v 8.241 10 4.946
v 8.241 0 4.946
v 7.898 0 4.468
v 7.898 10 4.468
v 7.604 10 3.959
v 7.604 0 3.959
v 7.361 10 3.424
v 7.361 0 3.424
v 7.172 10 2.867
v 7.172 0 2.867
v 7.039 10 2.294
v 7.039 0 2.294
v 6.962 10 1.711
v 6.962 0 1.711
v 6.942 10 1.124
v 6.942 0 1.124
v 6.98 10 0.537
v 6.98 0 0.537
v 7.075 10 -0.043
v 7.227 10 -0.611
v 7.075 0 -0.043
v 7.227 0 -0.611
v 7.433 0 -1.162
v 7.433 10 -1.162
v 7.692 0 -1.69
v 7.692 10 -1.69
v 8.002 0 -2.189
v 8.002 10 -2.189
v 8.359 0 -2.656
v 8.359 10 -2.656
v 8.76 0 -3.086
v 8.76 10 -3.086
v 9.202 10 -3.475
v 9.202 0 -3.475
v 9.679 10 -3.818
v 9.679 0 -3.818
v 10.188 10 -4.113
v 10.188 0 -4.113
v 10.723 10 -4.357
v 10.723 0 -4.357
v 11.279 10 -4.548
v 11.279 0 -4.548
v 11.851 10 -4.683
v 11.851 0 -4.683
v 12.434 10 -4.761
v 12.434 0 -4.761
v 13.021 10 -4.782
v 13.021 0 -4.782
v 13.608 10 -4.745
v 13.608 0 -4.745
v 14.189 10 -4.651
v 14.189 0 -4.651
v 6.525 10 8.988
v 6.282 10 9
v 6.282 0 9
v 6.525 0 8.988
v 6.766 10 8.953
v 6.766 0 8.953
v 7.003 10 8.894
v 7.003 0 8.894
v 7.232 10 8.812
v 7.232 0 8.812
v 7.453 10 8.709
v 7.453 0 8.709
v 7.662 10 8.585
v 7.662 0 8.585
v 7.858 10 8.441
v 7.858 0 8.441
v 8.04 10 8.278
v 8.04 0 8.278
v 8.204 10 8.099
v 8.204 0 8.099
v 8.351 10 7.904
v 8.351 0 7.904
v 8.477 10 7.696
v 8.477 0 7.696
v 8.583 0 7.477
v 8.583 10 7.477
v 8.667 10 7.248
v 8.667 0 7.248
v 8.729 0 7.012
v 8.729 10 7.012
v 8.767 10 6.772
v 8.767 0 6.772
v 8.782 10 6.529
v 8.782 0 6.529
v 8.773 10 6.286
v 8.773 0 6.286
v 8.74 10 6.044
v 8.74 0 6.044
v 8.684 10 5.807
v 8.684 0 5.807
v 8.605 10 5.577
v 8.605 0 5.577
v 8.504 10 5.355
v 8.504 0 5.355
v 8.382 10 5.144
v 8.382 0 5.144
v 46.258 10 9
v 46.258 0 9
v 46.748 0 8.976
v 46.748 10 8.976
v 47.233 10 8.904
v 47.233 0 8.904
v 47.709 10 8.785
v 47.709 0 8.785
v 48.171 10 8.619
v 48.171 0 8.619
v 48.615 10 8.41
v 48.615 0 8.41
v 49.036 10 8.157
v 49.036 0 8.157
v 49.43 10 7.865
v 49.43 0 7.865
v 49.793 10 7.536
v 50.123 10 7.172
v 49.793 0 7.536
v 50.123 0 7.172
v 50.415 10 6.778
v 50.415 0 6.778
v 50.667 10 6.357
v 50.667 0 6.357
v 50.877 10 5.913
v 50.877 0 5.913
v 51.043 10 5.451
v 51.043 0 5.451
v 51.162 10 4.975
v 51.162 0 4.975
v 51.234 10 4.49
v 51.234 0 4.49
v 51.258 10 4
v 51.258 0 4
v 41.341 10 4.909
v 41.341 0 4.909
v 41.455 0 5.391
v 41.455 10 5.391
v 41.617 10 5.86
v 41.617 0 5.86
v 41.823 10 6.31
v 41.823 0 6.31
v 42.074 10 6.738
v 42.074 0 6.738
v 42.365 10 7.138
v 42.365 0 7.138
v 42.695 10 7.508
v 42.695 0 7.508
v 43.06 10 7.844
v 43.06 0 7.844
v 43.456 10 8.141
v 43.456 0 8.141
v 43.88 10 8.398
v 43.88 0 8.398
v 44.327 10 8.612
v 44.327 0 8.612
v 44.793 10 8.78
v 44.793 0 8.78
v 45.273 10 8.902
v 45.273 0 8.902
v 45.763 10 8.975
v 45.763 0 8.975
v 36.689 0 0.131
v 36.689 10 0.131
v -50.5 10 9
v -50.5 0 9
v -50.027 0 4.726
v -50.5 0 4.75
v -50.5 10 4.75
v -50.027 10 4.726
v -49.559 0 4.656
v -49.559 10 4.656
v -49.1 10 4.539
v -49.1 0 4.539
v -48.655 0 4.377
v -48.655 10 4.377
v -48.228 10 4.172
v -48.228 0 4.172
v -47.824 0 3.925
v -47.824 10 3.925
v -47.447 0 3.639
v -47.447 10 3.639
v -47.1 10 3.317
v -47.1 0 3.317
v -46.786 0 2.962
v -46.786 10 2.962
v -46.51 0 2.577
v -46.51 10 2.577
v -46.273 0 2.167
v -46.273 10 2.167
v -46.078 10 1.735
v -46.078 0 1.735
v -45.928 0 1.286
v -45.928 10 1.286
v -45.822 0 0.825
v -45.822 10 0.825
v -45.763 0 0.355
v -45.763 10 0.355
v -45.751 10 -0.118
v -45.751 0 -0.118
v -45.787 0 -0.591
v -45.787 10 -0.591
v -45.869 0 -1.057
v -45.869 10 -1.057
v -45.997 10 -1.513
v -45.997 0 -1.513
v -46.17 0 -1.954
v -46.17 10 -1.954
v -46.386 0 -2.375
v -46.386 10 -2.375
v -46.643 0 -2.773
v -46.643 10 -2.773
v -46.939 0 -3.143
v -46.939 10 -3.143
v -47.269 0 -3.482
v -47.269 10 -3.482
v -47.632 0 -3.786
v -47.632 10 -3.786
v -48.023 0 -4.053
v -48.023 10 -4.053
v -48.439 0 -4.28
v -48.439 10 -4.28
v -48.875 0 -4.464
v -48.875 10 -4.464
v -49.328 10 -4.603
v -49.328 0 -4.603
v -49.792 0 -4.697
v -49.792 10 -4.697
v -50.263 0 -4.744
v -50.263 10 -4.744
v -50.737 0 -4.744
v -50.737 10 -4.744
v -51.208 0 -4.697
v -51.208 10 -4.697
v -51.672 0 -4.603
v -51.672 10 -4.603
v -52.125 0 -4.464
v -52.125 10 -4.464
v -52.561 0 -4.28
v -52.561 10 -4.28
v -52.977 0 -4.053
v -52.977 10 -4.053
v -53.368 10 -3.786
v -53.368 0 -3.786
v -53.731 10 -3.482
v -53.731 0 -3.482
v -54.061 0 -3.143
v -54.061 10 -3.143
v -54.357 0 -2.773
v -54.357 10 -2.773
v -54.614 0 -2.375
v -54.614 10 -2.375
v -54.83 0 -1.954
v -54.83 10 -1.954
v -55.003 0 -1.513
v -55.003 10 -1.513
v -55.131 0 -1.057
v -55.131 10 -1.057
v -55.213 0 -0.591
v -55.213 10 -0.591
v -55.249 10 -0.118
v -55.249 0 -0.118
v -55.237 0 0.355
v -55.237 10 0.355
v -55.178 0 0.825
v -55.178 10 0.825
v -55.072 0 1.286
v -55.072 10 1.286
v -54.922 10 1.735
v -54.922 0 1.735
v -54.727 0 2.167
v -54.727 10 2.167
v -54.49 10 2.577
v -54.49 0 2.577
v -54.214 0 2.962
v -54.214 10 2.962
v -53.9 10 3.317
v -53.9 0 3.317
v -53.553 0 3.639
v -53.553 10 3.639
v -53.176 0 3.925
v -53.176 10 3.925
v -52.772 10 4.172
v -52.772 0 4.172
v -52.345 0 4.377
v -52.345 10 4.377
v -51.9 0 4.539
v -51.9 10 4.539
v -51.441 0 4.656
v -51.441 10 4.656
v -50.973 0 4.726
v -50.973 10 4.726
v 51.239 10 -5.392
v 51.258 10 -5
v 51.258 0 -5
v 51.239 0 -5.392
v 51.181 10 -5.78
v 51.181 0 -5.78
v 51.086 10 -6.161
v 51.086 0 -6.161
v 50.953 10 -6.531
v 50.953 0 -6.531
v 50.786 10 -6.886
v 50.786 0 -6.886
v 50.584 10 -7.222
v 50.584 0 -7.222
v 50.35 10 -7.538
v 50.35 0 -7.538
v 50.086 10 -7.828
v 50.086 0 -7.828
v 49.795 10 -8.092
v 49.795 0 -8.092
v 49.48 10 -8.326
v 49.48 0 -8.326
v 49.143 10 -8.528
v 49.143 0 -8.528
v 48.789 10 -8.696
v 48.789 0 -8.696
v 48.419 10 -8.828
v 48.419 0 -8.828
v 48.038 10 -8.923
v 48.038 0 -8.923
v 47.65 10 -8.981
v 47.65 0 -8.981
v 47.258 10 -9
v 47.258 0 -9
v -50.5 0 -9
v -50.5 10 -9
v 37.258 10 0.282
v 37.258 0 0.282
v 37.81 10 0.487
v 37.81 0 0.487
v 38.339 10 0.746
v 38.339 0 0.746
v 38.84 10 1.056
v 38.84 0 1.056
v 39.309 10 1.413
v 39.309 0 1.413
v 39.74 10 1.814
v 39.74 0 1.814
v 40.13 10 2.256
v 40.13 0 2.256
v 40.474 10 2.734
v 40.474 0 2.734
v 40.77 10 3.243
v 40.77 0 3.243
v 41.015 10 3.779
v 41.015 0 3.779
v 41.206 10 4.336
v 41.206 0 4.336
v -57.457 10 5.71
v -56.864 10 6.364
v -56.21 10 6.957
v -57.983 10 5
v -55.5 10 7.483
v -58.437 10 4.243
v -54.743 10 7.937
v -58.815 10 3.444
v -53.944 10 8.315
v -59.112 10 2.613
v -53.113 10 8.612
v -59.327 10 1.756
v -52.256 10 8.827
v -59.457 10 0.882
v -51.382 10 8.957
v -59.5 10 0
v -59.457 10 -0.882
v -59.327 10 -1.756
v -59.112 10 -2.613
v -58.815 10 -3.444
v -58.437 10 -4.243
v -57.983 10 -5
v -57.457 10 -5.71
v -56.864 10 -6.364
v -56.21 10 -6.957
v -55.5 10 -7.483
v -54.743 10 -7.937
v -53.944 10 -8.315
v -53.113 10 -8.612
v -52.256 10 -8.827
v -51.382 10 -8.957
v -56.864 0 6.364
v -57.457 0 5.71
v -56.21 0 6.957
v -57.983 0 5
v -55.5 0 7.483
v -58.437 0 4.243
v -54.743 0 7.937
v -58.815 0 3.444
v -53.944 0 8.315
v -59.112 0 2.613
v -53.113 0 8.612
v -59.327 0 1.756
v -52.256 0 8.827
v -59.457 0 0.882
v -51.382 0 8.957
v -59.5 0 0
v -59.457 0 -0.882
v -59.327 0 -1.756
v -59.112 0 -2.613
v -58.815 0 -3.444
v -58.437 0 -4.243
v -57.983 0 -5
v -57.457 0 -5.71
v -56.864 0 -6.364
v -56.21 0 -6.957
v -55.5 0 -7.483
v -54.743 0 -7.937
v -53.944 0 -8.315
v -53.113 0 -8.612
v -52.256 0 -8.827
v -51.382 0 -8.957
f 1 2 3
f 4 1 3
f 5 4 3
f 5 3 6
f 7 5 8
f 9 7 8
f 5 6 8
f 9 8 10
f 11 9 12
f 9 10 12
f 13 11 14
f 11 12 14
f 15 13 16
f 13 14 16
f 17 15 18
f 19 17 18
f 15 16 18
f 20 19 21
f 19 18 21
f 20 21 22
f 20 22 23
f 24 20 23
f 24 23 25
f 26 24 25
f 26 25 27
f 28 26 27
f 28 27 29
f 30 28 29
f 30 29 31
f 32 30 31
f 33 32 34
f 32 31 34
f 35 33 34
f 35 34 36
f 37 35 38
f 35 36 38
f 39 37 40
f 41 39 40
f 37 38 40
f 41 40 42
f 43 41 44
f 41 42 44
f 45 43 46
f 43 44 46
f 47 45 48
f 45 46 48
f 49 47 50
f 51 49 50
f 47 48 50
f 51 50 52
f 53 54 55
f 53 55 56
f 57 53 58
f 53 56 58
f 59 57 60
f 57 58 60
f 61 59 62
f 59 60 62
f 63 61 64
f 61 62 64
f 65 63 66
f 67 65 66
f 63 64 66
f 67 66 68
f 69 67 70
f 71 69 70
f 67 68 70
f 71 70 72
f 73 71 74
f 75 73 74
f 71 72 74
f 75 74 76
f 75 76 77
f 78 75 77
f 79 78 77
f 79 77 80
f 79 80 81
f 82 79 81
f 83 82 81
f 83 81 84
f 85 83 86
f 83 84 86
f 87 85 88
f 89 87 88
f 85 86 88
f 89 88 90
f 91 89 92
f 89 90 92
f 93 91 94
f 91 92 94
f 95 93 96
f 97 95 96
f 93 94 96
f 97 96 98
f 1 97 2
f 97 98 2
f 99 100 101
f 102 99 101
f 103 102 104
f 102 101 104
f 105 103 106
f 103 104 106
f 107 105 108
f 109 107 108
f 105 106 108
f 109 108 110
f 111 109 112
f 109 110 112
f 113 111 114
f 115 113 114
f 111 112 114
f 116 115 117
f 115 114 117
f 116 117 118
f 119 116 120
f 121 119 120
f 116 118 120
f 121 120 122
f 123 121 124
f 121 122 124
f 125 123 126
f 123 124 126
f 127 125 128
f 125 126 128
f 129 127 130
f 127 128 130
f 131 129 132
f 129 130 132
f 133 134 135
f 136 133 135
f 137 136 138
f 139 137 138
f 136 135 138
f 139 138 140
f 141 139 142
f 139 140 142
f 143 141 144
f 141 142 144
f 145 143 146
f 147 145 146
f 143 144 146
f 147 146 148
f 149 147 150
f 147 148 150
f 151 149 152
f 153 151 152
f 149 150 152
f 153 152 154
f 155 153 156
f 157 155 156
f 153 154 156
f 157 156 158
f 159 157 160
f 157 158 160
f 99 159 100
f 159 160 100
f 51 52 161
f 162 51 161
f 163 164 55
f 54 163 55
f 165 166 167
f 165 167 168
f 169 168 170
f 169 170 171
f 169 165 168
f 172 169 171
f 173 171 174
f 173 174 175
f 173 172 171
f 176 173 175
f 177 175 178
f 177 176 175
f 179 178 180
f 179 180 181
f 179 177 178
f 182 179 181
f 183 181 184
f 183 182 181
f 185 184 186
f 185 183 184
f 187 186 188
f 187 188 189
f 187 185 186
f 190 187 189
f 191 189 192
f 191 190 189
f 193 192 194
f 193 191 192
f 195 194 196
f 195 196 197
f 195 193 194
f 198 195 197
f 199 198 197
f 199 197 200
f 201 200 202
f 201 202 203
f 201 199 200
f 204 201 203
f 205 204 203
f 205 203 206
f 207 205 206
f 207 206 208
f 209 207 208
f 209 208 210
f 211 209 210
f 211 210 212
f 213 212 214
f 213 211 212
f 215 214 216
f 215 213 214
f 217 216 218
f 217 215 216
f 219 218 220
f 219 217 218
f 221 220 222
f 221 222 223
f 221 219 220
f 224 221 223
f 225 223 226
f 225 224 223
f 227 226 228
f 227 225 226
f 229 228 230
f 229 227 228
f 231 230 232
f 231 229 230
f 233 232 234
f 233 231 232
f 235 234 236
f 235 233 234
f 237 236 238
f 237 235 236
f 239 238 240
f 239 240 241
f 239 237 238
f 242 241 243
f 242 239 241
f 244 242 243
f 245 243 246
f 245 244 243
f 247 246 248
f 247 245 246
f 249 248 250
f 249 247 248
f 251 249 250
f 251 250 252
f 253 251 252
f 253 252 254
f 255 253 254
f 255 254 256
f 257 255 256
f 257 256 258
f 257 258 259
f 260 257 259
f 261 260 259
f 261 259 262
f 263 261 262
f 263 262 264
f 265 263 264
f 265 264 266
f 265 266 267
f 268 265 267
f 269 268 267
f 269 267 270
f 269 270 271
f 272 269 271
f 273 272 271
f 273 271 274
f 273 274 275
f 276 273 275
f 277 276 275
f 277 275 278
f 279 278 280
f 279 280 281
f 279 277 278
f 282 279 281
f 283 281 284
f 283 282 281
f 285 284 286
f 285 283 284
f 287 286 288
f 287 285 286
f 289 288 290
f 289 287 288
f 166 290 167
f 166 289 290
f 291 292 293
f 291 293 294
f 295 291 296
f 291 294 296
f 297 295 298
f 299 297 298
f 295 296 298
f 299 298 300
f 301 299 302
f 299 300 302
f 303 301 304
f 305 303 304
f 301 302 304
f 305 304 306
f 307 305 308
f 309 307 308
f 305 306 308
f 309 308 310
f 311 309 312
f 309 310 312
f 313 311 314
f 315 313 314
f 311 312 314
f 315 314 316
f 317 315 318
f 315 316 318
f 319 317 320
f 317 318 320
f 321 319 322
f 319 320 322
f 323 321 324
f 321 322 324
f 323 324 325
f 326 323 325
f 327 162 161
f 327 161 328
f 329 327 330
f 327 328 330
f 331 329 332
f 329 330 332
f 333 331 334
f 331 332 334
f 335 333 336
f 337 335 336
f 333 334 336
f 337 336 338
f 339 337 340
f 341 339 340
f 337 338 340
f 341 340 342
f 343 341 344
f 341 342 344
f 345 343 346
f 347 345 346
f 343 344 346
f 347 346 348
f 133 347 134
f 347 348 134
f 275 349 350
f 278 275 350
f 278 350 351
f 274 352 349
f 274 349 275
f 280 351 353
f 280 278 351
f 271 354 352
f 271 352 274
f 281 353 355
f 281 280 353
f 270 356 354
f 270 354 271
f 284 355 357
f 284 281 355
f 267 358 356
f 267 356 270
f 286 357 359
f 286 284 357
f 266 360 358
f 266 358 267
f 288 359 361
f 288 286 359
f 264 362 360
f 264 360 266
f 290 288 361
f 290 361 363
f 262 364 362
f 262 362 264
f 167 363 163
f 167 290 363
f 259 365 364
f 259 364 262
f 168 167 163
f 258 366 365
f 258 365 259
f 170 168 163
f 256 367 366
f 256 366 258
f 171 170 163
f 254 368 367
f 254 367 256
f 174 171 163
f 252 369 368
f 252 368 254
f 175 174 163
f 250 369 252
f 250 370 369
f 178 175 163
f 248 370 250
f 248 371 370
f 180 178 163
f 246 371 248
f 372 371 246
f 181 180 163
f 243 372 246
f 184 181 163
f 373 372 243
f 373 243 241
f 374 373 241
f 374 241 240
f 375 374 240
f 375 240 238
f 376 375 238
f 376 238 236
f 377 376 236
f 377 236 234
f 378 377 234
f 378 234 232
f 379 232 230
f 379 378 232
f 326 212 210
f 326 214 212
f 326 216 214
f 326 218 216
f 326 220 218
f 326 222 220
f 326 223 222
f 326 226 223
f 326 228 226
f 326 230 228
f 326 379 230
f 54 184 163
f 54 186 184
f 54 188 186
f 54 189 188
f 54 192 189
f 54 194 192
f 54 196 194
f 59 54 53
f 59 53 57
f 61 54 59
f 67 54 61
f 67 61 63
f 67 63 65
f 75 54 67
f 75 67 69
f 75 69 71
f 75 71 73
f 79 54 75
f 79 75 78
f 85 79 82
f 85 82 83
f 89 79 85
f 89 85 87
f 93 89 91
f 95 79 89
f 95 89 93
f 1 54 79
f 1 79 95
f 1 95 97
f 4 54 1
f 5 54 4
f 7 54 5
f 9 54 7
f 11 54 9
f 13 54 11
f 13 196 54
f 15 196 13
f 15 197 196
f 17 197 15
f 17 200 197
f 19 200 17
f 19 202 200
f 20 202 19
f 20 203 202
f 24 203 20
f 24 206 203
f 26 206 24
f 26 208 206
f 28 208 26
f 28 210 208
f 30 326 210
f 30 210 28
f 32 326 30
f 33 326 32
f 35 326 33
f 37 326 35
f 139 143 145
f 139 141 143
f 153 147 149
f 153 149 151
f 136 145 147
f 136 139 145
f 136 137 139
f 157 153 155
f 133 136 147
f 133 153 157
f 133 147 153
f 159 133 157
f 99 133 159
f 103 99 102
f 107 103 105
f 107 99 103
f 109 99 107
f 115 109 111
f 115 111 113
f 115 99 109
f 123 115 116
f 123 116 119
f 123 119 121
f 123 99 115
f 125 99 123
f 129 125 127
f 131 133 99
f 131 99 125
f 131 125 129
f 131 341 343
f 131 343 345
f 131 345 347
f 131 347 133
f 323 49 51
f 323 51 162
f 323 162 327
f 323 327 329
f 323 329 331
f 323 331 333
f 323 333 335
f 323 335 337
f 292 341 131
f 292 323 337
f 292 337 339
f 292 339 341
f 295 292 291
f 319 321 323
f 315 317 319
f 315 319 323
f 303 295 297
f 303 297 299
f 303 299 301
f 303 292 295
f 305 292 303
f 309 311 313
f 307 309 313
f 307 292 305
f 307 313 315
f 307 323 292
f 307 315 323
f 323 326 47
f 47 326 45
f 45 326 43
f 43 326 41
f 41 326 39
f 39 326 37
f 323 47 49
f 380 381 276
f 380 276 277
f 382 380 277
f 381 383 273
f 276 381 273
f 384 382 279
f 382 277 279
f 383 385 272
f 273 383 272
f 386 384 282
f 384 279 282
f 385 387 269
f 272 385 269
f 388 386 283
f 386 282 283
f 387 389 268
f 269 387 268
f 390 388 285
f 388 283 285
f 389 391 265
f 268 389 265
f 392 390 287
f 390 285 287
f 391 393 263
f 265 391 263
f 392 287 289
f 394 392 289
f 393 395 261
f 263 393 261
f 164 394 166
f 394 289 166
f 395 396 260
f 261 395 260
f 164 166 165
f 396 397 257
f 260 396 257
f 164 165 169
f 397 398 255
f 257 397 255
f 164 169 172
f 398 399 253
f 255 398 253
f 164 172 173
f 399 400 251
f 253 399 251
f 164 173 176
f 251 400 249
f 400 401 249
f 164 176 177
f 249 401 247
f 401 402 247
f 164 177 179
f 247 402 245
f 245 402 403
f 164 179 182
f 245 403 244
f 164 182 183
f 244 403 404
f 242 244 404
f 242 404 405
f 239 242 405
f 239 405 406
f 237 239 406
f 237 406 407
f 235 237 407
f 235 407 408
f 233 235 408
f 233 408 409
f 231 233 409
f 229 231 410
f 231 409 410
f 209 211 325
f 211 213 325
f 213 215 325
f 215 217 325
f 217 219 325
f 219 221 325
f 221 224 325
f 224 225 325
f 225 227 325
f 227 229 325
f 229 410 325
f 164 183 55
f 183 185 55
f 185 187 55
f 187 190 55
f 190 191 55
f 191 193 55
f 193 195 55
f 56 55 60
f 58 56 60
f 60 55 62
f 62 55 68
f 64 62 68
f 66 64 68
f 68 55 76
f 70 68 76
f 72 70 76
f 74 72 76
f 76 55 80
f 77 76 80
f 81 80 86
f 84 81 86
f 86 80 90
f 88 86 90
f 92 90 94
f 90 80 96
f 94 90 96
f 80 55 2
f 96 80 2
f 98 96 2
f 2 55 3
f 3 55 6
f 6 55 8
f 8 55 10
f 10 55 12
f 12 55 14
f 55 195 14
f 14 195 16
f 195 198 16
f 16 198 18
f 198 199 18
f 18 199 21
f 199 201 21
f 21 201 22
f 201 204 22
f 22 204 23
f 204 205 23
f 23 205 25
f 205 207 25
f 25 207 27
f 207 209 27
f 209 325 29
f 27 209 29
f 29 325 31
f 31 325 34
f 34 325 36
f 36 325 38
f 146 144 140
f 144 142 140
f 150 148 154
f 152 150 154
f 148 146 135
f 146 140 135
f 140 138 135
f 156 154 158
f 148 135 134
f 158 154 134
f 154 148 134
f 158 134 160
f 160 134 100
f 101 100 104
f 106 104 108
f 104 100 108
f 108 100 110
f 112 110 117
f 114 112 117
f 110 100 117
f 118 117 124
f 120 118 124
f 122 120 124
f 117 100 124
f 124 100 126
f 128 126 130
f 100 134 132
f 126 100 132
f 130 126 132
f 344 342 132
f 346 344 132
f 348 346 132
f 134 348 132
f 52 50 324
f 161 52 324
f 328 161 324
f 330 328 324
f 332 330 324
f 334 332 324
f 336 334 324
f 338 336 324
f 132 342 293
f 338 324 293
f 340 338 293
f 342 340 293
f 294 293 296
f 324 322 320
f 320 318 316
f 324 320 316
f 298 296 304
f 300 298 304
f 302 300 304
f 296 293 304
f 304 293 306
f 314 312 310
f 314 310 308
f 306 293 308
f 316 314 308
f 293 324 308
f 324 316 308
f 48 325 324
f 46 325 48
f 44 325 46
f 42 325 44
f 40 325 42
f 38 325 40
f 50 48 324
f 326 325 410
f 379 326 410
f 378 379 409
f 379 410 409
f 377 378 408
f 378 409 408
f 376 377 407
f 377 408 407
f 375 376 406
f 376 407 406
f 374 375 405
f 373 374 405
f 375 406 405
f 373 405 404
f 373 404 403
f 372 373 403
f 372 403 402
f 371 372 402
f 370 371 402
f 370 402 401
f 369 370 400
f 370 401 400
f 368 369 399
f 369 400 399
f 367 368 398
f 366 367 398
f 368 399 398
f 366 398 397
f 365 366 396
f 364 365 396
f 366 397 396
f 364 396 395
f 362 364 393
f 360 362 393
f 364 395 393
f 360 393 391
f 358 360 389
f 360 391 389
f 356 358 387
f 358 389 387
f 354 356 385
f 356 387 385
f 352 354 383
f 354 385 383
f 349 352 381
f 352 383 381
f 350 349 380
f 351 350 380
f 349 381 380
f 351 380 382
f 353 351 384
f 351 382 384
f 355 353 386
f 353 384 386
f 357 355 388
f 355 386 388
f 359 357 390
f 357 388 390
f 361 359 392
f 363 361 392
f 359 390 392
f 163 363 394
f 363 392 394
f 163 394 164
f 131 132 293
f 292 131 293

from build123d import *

# Parameters (mm, degrees)
SKETCH1_R           = 4.75
BOSS_EXTRUDE1_DEPTH = 10


with BuildPart() as part:
    # Sketch1 → Boss-Extrude1 (new body)
    with BuildSketch(Plane(origin=(0, 0, 0), x_dir=(1, 0, 0), z_dir=(0, 1, 0))):
        with BuildLine():
            Line((47.257849632, 9), (-50.5, 9))
            ThreePointArc((-50.5, 9), (-59.5, 0), (-50.5, -9))
            Line((-50.5, -9), (6.281995059, -9))
            ThreePointArc((6.281995059, -9), (8.533017918, -7.587610265), (8.240583514, -4.946316871))
            ThreePointArc((8.240583514, -4.946316871), (7.841183108, 1.943198276), (14.18866595, 4.651408242))
            Line((14.18866595, 4.651408242), (36.68866595, -0.131114396))
            ThreePointArc((36.68866595, -0.131114396), (39.739895868, -1.814169405), (41.341188802, -4.909090909))
            ThreePointArc((41.341188802, -4.909090909), (43.059838886, -7.843530574), (46.257849632, -9))
            ThreePointArc((46.257849632, -9), (49.793383538, -7.535533906), (51.257849632, -4))
            Line((51.257849632, -4), (51.257849632, 5))
            ThreePointArc((51.257849632, 5), (50.086276756, 7.828427125), (47.257849632, 9))
        make_face()
        with Locations(Location((-50.5, 0, 0), (0, 0, 270))):
            Circle(SKETCH1_R, mode=Mode.SUBTRACT)
    extrude(amount=BOSS_EXTRUDE1_DEPTH)


solid = part.part
